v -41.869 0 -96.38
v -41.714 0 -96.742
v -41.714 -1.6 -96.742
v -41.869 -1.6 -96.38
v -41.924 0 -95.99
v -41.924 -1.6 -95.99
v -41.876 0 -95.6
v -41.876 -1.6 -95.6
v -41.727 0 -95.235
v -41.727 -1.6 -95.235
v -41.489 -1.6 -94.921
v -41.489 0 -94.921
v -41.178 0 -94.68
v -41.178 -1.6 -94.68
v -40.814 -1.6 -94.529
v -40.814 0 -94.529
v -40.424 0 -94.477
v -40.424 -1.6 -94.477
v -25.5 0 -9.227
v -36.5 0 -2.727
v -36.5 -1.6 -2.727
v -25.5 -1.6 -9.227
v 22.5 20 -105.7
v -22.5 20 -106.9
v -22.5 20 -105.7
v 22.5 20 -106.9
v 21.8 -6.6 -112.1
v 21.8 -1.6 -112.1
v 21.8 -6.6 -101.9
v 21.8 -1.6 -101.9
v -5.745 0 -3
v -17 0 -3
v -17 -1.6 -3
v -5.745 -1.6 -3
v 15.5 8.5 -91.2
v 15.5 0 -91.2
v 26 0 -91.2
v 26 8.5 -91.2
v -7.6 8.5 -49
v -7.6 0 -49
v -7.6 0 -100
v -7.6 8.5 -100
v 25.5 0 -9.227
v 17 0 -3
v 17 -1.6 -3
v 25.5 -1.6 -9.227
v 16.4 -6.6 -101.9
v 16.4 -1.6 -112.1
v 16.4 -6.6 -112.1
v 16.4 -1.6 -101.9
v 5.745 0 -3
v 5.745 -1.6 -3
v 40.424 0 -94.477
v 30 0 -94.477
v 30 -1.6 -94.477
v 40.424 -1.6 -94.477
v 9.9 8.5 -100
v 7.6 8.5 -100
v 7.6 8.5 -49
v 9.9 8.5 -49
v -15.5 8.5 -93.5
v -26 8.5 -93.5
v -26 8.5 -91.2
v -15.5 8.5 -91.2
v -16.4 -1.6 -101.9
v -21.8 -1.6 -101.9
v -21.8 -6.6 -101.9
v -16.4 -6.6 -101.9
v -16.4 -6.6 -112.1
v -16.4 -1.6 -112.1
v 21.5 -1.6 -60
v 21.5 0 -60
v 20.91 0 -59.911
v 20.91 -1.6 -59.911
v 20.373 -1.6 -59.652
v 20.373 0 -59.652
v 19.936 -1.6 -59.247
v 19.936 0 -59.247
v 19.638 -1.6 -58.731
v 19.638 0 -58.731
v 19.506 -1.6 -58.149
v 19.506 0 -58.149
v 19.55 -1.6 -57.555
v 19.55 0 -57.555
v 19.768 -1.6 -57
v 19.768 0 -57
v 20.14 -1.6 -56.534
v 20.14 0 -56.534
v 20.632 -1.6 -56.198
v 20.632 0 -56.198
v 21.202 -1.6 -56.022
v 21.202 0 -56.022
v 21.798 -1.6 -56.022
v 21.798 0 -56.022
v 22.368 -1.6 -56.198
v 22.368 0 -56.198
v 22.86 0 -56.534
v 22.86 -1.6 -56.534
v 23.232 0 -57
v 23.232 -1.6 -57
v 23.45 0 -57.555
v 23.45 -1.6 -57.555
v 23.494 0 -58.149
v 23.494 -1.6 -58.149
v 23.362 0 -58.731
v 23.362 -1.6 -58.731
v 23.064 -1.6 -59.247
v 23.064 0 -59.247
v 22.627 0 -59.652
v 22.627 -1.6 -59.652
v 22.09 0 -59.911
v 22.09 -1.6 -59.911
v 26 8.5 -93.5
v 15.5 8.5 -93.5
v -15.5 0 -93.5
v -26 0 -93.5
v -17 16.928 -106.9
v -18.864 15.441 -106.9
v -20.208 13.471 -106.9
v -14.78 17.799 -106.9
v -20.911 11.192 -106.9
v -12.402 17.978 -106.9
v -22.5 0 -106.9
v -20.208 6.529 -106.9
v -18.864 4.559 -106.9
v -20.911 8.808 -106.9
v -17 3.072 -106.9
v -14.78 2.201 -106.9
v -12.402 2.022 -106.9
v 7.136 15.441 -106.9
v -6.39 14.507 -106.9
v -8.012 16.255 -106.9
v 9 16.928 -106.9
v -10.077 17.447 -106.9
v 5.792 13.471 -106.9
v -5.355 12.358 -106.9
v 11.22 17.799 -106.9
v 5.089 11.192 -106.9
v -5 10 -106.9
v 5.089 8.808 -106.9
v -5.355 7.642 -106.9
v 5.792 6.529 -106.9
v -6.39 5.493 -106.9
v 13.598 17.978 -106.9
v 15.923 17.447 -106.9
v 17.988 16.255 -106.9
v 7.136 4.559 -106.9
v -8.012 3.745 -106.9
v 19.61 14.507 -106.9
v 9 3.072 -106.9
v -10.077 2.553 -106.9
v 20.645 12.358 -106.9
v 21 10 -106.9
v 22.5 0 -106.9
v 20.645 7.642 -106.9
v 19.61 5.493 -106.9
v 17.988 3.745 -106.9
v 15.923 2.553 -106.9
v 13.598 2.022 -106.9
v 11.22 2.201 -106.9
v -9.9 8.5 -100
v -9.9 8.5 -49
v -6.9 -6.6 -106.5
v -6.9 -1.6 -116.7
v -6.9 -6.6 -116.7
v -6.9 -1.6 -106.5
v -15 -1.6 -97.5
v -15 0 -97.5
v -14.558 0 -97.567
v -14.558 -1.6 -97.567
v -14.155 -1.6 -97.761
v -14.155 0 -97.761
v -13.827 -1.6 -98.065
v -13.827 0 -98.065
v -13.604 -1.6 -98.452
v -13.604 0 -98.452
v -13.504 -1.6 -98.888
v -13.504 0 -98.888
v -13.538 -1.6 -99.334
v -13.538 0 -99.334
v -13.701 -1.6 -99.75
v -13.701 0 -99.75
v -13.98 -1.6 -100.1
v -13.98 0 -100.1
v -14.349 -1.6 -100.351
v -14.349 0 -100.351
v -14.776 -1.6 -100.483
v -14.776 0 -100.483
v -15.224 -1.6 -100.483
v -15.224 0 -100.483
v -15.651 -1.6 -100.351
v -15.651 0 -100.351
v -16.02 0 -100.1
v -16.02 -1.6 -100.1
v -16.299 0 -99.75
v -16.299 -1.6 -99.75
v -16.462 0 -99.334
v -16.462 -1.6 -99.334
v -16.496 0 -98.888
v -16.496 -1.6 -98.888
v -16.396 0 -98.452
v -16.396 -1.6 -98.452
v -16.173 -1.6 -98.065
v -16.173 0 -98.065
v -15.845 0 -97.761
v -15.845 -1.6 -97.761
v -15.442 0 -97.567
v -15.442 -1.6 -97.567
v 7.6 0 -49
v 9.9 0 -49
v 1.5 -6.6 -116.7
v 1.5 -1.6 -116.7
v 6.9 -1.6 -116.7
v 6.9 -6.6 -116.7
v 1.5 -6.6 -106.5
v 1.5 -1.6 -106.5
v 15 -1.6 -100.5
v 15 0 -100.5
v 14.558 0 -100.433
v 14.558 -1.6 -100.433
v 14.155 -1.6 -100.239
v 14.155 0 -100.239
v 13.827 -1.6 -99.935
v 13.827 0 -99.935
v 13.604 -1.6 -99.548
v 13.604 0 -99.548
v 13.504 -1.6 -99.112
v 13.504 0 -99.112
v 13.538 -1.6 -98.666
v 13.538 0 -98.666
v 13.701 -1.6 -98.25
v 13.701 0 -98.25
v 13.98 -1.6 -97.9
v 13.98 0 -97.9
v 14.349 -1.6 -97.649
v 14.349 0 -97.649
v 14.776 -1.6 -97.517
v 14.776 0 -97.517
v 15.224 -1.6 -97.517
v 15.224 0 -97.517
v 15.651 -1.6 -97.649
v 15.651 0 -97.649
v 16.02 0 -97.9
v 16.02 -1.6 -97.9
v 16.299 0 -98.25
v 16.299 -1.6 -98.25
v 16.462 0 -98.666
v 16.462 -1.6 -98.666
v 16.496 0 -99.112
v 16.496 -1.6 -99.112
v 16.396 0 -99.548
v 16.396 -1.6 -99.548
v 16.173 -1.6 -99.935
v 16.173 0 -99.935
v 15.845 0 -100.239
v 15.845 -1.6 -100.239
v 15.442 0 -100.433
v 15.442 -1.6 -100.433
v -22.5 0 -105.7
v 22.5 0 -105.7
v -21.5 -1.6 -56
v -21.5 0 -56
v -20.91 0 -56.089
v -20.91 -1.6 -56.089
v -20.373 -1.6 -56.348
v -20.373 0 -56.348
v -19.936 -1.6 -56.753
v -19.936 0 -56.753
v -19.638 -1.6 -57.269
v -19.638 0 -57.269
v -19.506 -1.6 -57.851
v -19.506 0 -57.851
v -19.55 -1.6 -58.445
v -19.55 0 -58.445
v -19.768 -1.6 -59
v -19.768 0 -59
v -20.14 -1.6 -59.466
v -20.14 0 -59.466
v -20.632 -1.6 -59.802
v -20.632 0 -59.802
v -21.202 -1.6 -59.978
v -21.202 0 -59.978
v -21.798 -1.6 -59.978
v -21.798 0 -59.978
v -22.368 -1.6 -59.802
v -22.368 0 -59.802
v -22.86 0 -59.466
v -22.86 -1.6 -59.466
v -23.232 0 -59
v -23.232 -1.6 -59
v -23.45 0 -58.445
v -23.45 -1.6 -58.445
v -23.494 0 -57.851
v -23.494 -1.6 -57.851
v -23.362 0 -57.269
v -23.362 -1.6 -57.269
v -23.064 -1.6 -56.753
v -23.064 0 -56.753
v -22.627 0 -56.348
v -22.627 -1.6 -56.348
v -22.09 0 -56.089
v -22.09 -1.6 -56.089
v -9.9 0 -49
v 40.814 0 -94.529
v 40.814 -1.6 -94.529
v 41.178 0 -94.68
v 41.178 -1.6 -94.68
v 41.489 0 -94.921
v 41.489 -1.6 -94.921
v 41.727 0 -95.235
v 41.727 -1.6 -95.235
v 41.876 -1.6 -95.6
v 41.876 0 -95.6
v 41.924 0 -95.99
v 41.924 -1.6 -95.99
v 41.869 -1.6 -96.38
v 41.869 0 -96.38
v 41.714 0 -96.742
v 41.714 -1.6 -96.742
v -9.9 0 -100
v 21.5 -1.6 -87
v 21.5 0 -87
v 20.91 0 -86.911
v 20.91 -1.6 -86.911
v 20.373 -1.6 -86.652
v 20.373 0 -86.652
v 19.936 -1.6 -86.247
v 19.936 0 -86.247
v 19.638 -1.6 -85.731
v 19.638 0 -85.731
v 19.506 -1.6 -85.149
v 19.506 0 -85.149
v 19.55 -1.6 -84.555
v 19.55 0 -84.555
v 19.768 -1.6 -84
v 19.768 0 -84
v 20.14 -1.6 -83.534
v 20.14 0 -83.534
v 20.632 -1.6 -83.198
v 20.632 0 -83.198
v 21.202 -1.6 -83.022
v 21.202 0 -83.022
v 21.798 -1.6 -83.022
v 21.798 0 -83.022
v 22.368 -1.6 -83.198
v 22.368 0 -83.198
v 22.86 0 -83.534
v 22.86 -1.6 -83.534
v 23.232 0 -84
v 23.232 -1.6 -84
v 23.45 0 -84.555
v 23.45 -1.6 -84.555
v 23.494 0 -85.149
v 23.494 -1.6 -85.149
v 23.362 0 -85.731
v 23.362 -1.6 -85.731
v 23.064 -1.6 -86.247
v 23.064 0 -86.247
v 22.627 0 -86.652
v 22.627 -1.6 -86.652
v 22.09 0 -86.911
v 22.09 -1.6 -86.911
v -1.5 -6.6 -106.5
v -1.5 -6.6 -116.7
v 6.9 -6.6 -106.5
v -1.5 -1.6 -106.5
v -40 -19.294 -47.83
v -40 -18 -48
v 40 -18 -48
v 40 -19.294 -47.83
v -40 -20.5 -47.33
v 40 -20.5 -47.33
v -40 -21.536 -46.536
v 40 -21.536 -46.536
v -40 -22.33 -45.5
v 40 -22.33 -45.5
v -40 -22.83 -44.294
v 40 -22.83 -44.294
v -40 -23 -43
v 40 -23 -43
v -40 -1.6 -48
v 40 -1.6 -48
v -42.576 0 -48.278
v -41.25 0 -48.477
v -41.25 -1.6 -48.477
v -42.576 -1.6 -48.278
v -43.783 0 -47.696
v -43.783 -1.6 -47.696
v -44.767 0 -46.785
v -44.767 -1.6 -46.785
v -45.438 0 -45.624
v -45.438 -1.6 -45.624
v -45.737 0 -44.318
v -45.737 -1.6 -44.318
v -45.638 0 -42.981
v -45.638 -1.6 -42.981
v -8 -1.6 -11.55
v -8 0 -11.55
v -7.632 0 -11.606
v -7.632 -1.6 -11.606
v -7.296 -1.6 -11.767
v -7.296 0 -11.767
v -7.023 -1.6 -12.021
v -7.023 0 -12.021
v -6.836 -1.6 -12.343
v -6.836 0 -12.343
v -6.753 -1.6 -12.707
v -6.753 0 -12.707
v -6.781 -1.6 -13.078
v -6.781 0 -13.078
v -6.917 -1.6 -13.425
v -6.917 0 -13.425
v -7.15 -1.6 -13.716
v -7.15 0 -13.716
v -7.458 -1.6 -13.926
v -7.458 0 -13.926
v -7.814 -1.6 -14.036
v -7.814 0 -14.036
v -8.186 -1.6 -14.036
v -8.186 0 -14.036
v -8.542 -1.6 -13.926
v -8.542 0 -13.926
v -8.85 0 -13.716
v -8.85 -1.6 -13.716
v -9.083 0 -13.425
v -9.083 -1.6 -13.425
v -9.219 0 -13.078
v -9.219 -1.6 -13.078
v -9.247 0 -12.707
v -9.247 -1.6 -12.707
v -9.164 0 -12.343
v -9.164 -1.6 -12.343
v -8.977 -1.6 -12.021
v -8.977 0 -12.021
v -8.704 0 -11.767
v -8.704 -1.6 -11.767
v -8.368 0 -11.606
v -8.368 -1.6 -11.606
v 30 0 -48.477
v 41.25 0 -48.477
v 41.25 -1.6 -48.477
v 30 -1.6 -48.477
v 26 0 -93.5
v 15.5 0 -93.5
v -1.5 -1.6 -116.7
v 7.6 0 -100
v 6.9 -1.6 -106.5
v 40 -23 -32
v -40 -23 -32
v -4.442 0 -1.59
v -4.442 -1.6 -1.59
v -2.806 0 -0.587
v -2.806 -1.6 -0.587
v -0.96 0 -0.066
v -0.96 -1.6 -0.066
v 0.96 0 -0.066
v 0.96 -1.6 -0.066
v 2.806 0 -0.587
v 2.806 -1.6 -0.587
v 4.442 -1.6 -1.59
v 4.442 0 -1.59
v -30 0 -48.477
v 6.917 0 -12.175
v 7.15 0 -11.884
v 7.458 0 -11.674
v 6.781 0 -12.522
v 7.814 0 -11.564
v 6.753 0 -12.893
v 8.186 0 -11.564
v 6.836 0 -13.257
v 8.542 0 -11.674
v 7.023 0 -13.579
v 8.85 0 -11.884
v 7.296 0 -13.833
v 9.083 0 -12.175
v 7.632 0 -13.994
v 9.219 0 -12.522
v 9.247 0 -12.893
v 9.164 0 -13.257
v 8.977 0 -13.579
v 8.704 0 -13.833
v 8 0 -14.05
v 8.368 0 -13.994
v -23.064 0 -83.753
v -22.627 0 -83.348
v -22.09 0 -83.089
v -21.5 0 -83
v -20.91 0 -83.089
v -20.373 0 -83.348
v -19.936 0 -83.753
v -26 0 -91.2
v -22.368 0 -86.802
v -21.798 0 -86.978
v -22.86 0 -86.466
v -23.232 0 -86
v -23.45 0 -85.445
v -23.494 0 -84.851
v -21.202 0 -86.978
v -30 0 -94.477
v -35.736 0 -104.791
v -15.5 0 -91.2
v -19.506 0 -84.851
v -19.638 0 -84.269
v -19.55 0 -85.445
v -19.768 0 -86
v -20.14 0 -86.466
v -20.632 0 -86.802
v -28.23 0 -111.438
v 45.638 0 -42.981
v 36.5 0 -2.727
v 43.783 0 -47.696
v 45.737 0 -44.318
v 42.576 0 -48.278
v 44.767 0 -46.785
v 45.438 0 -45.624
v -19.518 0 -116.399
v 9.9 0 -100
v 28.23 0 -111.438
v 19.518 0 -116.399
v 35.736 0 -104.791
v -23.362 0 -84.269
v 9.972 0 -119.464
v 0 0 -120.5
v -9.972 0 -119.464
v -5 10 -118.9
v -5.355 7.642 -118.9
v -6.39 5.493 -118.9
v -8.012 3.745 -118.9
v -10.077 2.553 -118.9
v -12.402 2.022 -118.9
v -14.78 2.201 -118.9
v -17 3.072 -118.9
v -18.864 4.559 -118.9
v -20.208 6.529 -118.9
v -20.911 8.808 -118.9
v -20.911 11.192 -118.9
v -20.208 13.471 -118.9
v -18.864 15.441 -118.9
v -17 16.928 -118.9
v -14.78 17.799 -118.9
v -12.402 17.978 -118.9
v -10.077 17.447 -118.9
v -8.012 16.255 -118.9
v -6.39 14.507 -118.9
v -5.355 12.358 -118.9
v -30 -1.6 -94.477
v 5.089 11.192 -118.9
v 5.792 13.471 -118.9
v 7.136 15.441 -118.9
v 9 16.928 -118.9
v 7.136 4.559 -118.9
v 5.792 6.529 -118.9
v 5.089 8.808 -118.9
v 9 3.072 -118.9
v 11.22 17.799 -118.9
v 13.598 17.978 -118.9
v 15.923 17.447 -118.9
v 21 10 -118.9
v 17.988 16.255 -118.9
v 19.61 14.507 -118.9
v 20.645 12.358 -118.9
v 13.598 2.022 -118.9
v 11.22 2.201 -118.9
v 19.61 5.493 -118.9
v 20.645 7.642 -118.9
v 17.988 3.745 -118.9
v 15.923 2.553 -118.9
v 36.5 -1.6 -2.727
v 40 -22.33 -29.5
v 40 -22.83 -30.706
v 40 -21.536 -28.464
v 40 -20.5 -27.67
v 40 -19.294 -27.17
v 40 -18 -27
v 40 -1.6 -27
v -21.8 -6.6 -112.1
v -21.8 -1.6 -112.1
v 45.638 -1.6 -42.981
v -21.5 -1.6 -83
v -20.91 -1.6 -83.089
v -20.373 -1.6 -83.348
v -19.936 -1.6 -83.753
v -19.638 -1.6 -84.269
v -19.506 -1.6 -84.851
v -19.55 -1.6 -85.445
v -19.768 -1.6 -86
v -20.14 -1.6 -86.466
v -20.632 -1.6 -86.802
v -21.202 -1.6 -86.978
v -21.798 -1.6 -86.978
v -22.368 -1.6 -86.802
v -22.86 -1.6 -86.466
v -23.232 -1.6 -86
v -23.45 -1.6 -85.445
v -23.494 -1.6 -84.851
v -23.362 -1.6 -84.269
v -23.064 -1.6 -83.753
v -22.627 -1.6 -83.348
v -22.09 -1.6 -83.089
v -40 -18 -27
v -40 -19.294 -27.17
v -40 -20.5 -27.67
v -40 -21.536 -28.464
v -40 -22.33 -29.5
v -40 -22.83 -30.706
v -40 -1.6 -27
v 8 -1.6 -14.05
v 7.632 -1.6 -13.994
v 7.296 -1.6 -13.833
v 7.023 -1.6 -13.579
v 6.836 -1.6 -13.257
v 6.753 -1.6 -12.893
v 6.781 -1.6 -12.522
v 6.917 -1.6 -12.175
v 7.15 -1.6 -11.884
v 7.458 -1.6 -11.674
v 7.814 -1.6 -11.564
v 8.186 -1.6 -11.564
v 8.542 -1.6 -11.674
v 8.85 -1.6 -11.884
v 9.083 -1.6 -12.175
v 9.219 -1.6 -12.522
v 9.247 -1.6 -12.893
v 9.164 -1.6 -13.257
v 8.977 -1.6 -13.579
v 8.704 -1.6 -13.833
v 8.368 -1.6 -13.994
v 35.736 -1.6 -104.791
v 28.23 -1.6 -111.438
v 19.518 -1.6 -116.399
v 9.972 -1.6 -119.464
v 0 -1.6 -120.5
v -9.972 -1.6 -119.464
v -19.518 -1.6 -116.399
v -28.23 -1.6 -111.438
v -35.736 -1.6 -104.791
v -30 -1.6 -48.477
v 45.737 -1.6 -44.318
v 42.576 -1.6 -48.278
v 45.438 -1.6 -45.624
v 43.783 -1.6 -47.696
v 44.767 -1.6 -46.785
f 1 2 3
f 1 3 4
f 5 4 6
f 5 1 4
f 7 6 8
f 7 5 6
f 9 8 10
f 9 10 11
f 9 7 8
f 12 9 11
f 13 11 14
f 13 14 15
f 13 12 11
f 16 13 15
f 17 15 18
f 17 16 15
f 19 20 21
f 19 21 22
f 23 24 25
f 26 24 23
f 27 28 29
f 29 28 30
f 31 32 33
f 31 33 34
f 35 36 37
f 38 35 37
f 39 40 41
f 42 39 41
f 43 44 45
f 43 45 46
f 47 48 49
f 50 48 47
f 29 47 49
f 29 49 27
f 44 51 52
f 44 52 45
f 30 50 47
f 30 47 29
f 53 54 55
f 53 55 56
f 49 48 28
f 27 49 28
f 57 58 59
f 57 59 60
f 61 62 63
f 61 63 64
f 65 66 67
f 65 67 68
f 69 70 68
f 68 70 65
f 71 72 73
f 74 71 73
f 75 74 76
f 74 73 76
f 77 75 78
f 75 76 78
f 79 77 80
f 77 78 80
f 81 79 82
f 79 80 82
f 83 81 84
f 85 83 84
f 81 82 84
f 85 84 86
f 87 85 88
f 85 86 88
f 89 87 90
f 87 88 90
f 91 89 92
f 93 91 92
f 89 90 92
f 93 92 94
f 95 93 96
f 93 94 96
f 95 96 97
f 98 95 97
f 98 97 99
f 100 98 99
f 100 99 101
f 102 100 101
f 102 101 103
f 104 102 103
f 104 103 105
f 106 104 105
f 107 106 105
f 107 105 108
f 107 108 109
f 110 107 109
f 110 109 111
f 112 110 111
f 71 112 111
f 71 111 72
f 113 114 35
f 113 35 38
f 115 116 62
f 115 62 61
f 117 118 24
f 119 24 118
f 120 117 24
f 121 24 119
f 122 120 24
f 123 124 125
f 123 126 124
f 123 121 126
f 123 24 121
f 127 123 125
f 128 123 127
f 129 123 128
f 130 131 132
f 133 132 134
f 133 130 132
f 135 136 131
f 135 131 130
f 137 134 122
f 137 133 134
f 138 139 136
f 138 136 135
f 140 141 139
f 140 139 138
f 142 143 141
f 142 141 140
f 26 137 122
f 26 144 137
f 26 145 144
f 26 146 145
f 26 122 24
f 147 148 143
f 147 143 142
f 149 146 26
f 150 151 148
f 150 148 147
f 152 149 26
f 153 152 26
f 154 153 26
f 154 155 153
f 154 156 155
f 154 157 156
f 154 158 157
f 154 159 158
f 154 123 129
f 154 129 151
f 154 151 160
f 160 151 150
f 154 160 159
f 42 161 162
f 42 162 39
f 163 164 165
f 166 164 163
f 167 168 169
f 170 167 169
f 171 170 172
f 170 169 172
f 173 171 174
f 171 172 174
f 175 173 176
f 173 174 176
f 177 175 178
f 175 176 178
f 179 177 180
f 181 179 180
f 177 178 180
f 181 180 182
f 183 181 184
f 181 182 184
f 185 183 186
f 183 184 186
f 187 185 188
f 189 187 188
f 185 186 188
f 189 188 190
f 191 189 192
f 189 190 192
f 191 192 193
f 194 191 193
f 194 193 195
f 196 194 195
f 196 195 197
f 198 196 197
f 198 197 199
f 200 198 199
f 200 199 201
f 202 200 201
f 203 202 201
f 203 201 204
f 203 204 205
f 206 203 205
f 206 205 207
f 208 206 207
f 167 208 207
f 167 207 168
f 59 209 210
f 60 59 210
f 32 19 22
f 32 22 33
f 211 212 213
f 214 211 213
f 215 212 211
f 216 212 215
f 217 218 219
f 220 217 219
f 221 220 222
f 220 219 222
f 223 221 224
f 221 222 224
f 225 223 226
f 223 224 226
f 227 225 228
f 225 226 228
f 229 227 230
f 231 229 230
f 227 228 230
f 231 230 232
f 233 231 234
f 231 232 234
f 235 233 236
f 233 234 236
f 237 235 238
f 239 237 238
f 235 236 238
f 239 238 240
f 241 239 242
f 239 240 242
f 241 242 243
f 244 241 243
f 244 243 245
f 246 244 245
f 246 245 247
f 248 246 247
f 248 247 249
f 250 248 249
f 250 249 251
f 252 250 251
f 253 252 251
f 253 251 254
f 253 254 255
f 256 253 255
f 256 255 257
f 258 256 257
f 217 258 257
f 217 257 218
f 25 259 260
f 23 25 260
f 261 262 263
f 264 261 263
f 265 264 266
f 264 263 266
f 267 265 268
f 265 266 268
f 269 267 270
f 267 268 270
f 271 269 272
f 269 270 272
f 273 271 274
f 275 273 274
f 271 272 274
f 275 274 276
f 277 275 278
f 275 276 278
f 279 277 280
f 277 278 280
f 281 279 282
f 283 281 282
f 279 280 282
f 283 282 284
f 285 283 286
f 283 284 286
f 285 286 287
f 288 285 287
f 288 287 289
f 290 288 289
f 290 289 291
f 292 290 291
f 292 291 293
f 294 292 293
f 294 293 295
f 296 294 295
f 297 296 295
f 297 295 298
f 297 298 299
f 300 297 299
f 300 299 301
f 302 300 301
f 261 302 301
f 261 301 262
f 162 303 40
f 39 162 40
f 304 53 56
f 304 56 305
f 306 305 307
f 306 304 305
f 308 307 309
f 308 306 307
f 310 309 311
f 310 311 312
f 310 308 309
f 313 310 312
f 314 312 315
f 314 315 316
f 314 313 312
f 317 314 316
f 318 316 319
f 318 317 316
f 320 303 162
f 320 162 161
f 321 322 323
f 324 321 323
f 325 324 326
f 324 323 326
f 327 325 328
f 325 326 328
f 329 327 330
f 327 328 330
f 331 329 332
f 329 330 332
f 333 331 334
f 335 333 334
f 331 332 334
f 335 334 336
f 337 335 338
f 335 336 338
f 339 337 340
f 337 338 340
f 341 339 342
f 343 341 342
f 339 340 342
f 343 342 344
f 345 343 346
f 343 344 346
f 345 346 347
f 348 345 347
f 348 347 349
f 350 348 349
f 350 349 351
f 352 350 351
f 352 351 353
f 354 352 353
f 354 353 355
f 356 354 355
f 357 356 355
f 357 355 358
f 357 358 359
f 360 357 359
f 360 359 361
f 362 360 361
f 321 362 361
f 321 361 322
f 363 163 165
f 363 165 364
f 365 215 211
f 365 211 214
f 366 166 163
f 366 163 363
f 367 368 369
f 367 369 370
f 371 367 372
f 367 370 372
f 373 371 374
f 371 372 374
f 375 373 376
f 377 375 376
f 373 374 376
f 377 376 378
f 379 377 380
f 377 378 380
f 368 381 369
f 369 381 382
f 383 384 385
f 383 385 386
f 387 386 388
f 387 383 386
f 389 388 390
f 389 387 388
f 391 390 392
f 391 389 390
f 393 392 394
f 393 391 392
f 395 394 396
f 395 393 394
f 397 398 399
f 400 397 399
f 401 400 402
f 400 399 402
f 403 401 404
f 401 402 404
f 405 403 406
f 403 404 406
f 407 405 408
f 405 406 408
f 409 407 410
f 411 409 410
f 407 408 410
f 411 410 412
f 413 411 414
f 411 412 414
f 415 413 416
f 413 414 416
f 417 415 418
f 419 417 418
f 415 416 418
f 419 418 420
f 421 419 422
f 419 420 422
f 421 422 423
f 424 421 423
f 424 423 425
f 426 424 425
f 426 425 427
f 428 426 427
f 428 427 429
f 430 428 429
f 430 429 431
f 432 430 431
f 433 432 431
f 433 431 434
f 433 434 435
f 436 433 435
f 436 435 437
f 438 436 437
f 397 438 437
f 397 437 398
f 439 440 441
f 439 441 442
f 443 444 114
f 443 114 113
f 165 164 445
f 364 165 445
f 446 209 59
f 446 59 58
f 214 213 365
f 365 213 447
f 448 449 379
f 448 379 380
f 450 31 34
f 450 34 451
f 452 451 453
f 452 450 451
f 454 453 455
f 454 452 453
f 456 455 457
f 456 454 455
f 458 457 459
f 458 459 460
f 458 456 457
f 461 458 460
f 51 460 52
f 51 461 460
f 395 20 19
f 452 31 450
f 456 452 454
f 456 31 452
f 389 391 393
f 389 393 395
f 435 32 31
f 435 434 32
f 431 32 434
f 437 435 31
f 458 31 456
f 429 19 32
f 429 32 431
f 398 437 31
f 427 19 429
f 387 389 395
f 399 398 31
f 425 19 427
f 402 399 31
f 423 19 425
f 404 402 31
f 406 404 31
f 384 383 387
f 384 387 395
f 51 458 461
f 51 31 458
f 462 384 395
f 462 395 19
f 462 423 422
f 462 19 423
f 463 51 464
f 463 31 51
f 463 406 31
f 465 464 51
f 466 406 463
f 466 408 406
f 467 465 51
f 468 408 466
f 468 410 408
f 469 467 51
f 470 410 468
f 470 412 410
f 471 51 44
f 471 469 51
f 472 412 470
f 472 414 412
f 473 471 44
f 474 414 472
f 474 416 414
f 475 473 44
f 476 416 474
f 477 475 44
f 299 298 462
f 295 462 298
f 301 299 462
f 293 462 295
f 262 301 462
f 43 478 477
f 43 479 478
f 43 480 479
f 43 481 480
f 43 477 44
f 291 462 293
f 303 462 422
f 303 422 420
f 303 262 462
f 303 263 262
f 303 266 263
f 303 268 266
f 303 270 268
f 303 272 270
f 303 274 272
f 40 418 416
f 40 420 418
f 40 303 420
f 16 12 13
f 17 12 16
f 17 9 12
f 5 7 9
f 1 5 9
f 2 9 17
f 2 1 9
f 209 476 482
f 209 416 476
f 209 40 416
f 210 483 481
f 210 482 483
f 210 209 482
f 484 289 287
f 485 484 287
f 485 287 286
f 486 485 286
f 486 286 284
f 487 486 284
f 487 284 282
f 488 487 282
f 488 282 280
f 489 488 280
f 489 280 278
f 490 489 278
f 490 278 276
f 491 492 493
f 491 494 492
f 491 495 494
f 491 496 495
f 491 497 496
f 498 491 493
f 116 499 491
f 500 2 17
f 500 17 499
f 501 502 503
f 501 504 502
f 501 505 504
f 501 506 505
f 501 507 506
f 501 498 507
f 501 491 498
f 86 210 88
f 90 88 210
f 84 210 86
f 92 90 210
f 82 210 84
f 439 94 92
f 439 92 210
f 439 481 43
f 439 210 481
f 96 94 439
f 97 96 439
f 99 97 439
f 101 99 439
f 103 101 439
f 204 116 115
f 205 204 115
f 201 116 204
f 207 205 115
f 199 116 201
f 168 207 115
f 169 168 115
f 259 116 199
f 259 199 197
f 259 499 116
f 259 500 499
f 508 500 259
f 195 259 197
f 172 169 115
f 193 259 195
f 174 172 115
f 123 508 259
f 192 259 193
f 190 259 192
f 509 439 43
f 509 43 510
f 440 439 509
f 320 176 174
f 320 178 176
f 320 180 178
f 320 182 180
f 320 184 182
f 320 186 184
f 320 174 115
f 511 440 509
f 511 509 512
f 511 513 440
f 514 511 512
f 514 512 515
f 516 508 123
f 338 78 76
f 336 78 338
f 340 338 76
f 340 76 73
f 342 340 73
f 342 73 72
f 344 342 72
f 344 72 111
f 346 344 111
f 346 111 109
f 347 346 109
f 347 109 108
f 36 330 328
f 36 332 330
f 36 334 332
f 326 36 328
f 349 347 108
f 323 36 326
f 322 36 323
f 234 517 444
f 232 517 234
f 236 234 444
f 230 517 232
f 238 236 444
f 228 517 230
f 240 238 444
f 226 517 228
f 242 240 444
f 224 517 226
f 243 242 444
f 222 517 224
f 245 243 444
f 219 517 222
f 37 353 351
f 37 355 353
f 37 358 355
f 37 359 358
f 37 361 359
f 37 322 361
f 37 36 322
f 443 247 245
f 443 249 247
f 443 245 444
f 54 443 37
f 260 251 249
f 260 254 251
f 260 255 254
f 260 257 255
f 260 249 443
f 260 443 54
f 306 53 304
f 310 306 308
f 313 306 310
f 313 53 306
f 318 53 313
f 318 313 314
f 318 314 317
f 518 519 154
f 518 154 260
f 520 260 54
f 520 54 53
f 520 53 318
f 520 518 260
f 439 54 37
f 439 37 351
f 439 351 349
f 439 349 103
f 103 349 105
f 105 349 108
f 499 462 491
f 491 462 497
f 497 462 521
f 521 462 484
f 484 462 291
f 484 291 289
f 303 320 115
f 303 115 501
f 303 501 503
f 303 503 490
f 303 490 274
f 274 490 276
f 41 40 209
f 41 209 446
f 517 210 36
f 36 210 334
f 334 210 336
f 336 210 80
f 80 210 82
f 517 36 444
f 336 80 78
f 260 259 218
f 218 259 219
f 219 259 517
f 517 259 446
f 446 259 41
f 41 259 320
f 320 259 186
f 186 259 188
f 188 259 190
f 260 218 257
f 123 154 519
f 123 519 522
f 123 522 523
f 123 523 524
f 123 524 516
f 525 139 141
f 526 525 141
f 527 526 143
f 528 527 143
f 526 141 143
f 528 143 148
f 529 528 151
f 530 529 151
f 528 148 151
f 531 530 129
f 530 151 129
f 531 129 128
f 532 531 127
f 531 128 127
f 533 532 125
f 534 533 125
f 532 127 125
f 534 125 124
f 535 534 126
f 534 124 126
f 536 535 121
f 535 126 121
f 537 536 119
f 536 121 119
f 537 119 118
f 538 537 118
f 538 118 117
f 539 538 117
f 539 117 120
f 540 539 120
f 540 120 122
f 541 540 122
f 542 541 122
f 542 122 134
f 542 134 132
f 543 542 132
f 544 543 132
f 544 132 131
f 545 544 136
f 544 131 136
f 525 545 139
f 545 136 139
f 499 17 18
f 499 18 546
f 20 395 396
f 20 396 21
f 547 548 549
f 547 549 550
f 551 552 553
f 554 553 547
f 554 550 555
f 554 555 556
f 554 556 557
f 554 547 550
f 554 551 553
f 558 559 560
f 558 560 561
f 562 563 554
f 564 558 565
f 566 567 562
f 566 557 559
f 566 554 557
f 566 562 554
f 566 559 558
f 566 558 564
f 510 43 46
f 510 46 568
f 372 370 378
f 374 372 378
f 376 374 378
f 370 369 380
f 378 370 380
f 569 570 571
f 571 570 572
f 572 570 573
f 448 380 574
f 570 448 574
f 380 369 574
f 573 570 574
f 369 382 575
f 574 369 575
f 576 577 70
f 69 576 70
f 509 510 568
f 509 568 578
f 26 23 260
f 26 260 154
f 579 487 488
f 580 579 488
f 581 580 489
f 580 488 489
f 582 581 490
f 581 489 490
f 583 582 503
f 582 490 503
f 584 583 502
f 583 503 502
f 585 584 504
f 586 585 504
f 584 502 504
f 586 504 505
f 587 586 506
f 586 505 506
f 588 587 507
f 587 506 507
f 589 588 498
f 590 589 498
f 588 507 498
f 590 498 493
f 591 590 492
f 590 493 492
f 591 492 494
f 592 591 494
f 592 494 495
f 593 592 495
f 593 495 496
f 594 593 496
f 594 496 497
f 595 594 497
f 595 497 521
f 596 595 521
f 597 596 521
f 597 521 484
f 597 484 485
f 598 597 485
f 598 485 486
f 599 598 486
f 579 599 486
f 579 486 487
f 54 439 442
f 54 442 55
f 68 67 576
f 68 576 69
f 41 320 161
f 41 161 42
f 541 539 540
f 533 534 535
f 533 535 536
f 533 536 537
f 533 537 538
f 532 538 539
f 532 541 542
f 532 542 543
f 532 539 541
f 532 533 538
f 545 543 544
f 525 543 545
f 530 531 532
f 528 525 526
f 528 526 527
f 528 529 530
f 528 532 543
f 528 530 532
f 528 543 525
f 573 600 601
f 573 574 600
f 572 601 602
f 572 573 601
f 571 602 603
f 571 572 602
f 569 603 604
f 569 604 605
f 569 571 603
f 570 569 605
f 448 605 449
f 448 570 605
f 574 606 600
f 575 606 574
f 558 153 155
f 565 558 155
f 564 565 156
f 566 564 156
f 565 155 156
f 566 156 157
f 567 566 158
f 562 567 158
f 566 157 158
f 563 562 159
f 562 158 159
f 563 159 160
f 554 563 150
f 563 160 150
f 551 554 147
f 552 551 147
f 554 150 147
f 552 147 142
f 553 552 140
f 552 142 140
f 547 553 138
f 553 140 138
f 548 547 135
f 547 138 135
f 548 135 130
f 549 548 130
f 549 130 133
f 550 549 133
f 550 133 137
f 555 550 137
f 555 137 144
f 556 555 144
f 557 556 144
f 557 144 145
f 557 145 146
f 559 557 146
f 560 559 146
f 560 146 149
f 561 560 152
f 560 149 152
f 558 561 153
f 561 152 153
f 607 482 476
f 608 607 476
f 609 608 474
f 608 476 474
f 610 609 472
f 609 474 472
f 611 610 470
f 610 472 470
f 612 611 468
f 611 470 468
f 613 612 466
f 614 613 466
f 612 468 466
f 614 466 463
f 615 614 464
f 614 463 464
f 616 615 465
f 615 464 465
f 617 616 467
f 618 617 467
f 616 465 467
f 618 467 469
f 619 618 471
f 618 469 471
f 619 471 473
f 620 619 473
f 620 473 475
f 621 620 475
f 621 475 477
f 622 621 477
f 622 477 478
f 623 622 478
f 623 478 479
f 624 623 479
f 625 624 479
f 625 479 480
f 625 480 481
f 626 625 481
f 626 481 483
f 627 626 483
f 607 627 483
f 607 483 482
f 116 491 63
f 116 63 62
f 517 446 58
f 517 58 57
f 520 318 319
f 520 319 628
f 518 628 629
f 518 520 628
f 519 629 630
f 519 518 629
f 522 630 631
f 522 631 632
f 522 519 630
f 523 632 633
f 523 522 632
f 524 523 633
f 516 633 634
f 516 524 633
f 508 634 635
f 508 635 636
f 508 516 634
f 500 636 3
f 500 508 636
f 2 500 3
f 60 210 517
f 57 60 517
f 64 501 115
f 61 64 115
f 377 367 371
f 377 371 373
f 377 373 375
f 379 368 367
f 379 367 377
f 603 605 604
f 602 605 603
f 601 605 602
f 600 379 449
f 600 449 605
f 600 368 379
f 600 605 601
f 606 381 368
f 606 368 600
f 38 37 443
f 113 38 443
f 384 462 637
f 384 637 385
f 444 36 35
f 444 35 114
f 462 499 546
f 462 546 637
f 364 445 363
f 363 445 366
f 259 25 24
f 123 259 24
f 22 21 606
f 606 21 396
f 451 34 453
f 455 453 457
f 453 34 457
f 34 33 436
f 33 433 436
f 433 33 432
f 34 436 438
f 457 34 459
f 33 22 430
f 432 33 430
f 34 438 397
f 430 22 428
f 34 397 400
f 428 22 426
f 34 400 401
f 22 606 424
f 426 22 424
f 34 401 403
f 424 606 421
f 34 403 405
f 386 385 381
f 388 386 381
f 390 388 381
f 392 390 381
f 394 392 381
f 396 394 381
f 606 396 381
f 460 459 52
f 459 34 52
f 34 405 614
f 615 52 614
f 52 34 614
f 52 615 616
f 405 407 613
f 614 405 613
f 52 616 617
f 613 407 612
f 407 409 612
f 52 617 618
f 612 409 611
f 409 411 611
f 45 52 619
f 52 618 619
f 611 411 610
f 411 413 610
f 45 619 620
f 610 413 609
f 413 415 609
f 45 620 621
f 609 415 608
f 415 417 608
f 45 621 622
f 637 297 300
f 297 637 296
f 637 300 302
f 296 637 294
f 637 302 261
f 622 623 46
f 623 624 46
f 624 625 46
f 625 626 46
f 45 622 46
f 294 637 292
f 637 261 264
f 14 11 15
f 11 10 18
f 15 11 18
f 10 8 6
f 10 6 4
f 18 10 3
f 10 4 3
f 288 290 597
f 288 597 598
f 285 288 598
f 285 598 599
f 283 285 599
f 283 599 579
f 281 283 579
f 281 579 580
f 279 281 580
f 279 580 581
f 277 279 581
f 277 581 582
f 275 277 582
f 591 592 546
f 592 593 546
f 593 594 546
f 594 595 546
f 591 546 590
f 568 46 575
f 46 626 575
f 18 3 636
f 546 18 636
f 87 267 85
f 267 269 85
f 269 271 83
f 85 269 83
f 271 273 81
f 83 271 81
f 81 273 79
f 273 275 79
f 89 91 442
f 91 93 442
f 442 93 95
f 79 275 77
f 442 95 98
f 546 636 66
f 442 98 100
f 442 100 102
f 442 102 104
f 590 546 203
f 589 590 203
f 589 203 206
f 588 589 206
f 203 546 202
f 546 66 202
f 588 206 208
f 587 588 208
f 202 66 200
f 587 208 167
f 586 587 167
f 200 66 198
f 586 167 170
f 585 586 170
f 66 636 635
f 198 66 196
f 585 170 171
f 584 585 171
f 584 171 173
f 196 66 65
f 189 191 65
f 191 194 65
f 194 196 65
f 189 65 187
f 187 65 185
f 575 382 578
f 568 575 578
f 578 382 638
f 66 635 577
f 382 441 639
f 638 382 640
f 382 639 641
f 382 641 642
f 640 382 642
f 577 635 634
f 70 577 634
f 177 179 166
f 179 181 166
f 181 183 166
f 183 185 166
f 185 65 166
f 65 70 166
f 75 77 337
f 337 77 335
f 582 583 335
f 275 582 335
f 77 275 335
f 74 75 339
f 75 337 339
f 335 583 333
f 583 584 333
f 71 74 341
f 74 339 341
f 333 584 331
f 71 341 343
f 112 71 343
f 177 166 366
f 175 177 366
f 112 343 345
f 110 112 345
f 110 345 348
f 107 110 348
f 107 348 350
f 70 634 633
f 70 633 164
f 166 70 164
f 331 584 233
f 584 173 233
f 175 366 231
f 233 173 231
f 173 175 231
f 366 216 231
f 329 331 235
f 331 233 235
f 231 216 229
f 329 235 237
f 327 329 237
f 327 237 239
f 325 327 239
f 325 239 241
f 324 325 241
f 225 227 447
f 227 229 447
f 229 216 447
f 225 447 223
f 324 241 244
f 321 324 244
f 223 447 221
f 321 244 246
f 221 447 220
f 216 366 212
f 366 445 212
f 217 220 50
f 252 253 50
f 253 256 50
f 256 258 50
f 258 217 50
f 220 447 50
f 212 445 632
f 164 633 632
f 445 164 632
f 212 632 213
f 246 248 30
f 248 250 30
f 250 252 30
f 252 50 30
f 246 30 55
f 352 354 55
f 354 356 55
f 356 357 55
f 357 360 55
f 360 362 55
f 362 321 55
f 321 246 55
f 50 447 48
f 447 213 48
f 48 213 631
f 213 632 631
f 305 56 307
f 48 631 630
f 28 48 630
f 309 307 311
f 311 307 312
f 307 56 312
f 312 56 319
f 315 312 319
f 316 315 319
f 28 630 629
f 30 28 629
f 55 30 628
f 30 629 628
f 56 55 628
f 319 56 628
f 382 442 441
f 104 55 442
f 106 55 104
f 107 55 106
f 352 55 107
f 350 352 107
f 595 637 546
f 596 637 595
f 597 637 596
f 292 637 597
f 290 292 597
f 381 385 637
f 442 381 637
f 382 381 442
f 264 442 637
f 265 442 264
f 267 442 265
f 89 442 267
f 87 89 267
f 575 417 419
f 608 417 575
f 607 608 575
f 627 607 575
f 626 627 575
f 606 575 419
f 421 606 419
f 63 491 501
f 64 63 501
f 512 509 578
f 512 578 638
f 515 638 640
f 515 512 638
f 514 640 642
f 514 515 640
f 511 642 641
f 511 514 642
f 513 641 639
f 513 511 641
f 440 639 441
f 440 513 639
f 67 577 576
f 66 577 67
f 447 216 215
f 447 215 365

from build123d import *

# Parameters (mm, degrees)
BOSS_EXTRUDE1_DEPTH = 1.6
SKETCH6_W           = 45
SKETCH6_H           = 1.2
BOSS_EXTRUDE2_DEPTH = 20
SKETCH7_R           = 8
BOSS_EXTRUDE3_DEPTH = 12
SKETCH10_W          = 80
SKETCH10_H          = 21
BOSS_EXTRUDE4_DEPTH = 21.4
FILLET1_R           = 5
CUT_EXTRUDE1_REACH  = 132.929
SKETCH11_R          = 1.25
SKETCH11_R_2        = 2
SKETCH11_R_3        = 1.5
SKETCH12_W          = 2.3
SKETCH12_H          = 51
SKETCH12_W_2        = 10.5
SKETCH12_H_2        = 2.3
BOSS_EXTRUDE5_DEPTH = 8.5
SKETCH13_W          = 5.4
SKETCH13_H          = 10.2
BOSS_EXTRUDE7_DEPTH = 5


with BuildPart() as part:
    # Sketch5 → Boss-Extrude1 (new body)
    with BuildSketch(Plane(origin=(0, 0, 0), x_dir=(1, 0, 0), z_dir=(0, 1, 0))):
        with BuildLine():
            Line((-25.5, 9.227208522), (-17, 3))
            Line((-17, 3), (-5.744562647, 3))
            ThreePointArc((-5.744562647, 3), (0, 0), (5.744562647, 3))
            Line((5.744562647, 3), (17, 3))
            Line((17, 3), (25.5, 9.227208522))
            Line((25.5, 9.227208522), (36.5, 2.727208522))
            Line((36.5, 2.727208522), (45.638339075, 42.980975538))
            ThreePointArc((45.638339075, 42.980975538), (44.766606918, 46.784961322), (41.25, 48.477208522))
            Line((41.25, 48.477208522), (30, 48.477208522))
            Line((30, 48.477208522), (30, 94.477208522))
            Line((30, 94.477208522), (40.42392202, 94.477208522))
            ThreePointArc((40.42392202, 94.477208522), (41.72734925, 95.234862609), (41.714047191, 96.742438582))
            ThreePointArc((41.714047191, 96.742438582), (0, 120.5), (-41.714047191, 96.742438582))
            ThreePointArc((-41.714047191, 96.742438582), (-41.72734925, 95.234862609), (-40.42392202, 94.477208522))
            Line((-40.42392202, 94.477208522), (-30, 94.477208522))
            Line((-30, 94.477208522), (-30, 48.477208522))
            Line((-30, 48.477208522), (-41.25, 48.477208522))
            ThreePointArc((-41.25, 48.477208522), (-44.766606918, 46.784961322), (-45.638339075, 42.980975538))
            Line((-45.638339075, 42.980975538), (-36.5, 2.727208522))
            Line((-36.5, 2.727208522), (-25.5, 9.227208522))
        make_face()
    extrude(amount=-BOSS_EXTRUDE1_DEPTH)

    # Sketch6 → Boss-Extrude2 (add)
    with BuildSketch(Plane(origin=(0, 0, 0), x_dir=(1, 0, 0), z_dir=(0, 1, 0))):
        with Locations((0, 106.3)):
            Rectangle(SKETCH6_W, SKETCH6_H)
    extrude(amount=BOSS_EXTRUDE2_DEPTH)

    # Sketch7 → Boss-Extrude3 (add)
    with BuildSketch(Plane(origin=(0, 0, -106.9), x_dir=(-1, 0, 0), z_dir=(0, 0, -1))):
        with Locations(Location((-13, 10, 0), (0, 0, 180))):
            Circle(SKETCH7_R)
        with Locations(Location((13, 10, 0), (0, 0, 180))):
            Circle(SKETCH7_R)
    extrude(amount=BOSS_EXTRUDE3_DEPTH)

    # Sketch10 → Boss-Extrude4 (add)
    with BuildSketch(Plane.XZ.offset(1.6)):
        with Locations((0, -37.5)):
            Rectangle(SKETCH10_W, SKETCH10_H)
    extrude(amount=BOSS_EXTRUDE4_DEPTH)

    # Fillet1
    fillet1_edges = [part.edges().sort_by_distance(p)[0] for p in [
        (0, -23, -48),
        (0, -23, -27),
    ]]
    fillet(fillet1_edges, radius=FILLET1_R)

    # Sketch11 → Cut-Extrude1 (cut, up to next)
    with BuildSketch(Plane(origin=(0, 0, 0), x_dir=(1, 0, 0), z_dir=(0, 1, 0)), mode=Mode.PRIVATE) as cut_extrude1_sk1:
        with Locations(Location((-8, 12.8, 0), (0, 0, 270))):
            Circle(SKETCH11_R)
    cut_extrude1_tool1 = extrude(cut_extrude1_sk1.sketch, amount=-CUT_EXTRUDE1_REACH, mode=Mode.PRIVATE) & part.part
    # Sketch11 → Cut-Extrude1 (cut, up to next)
    with BuildSketch(Plane(origin=(0, 0, 0), x_dir=(1, 0, 0), z_dir=(0, 1, 0)), mode=Mode.PRIVATE) as cut_extrude1_sk2:
        with Locations(Location((-21.5, 58, 0), (0, 0, 270))):
            Circle(SKETCH11_R_2)
    cut_extrude1_tool2 = extrude(cut_extrude1_sk2.sketch, amount=-CUT_EXTRUDE1_REACH, mode=Mode.PRIVATE) & part.part
    # Sketch11 → Cut-Extrude1 (cut, up to next)
    with BuildSketch(Plane(origin=(0, 0, 0), x_dir=(1, 0, 0), z_dir=(0, 1, 0)), mode=Mode.PRIVATE) as cut_extrude1_sk3:
        with Locations(Location((-21.5, 85, 0), (0, 0, 270))):
            Circle(SKETCH11_R_2)
    cut_extrude1_tool3 = extrude(cut_extrude1_sk3.sketch, amount=-CUT_EXTRUDE1_REACH, mode=Mode.PRIVATE) & part.part
    # Sketch11 → Cut-Extrude1 (cut, up to next)
    with BuildSketch(Plane(origin=(0, 0, 0), x_dir=(1, 0, 0), z_dir=(0, 1, 0)), mode=Mode.PRIVATE) as cut_extrude1_sk4:
        with Locations(Location((-15, 99, 0), (0, 0, 270))):
            Circle(SKETCH11_R_3)
    cut_extrude1_tool4 = extrude(cut_extrude1_sk4.sketch, amount=-CUT_EXTRUDE1_REACH, mode=Mode.PRIVATE) & part.part
    # Sketch11 → Cut-Extrude1 (cut, up to next)
    with BuildSketch(Plane(origin=(0, 0, 0), x_dir=(1, 0, 0), z_dir=(0, 1, 0)), mode=Mode.PRIVATE) as cut_extrude1_sk5:
        with Locations(Location((15, 99, 0), (0, 0, 90))):
            Circle(SKETCH11_R_3)
    cut_extrude1_tool5 = extrude(cut_extrude1_sk5.sketch, amount=-CUT_EXTRUDE1_REACH, mode=Mode.PRIVATE) & part.part
    # Sketch11 → Cut-Extrude1 (cut, up to next)
    with BuildSketch(Plane(origin=(0, 0, 0), x_dir=(1, 0, 0), z_dir=(0, 1, 0)), mode=Mode.PRIVATE) as cut_extrude1_sk6:
        with Locations(Location((21.5, 85, 0), (0, 0, 90))):
            Circle(SKETCH11_R_2)
    cut_extrude1_tool6 = extrude(cut_extrude1_sk6.sketch, amount=-CUT_EXTRUDE1_REACH, mode=Mode.PRIVATE) & part.part
    # Sketch11 → Cut-Extrude1 (cut, up to next)
    with BuildSketch(Plane(origin=(0, 0, 0), x_dir=(1, 0, 0), z_dir=(0, 1, 0)), mode=Mode.PRIVATE) as cut_extrude1_sk7:
        with Locations(Location((21.5, 58, 0), (0, 0, 90))):
            Circle(SKETCH11_R_2)
    cut_extrude1_tool7 = extrude(cut_extrude1_sk7.sketch, amount=-CUT_EXTRUDE1_REACH, mode=Mode.PRIVATE) & part.part
    # Sketch11 → Cut-Extrude1 (cut, up to next)
    with BuildSketch(Plane(origin=(0, 0, 0), x_dir=(1, 0, 0), z_dir=(0, 1, 0)), mode=Mode.PRIVATE) as cut_extrude1_sk8:
        with Locations(Location((8, 12.8, 0), (0, 0, 90))):
            Circle(SKETCH11_R)
    cut_extrude1_tool8 = extrude(cut_extrude1_sk8.sketch, amount=-CUT_EXTRUDE1_REACH, mode=Mode.PRIVATE) & part.part
    add(cut_extrude1_tool1.solids().sort_by_distance((-8, 0, -12.8))[0], mode=Mode.SUBTRACT)
    add(cut_extrude1_tool2.solids().sort_by_distance((-21.5, 0, -58))[0], mode=Mode.SUBTRACT)
    add(cut_extrude1_tool3.solids().sort_by_distance((-21.5, 0, -85))[0], mode=Mode.SUBTRACT)
    add(cut_extrude1_tool4.solids().sort_by_distance((-15, 0, -99))[0], mode=Mode.SUBTRACT)
    add(cut_extrude1_tool5.solids().sort_by_distance((15, 0, -99))[0], mode=Mode.SUBTRACT)
    add(cut_extrude1_tool6.solids().sort_by_distance((21.5, 0, -85))[0], mode=Mode.SUBTRACT)
    add(cut_extrude1_tool7.solids().sort_by_distance((21.5, 0, -58))[0], mode=Mode.SUBTRACT)
    add(cut_extrude1_tool8.solids().sort_by_distance((8, 0, -12.8))[0], mode=Mode.SUBTRACT)

    # Sketch12 → Boss-Extrude5 (add)
    with BuildSketch(Plane(origin=(0, 0, 0), x_dir=(1, 0, 0), z_dir=(0, 1, 0))):
        with Locations((-8.75, 74.5)):
            Rectangle(SKETCH12_W, SKETCH12_H)
        with Locations((-20.75, 92.35)):
            Rectangle(SKETCH12_W_2, SKETCH12_H_2)
        with Locations((20.75, 92.35)):
            Rectangle(SKETCH12_W_2, SKETCH12_H_2)
        with Locations((8.75, 74.5)):
            Rectangle(SKETCH12_W, SKETCH12_H)
    extrude(amount=BOSS_EXTRUDE5_DEPTH)

    # Sketch13 → Boss-Extrude7 (add)
    with BuildSketch(Plane.XZ.offset(1.6)):
        with Locations((4.2, -111.6)):
            Rectangle(SKETCH13_W, SKETCH13_H)
        with Locations((-4.2, -111.6)):
            Rectangle(SKETCH13_W, SKETCH13_H)
        with Locations((-19.1, -107)):
            Rectangle(SKETCH13_W, SKETCH13_H)
        with Locations((19.1, -107)):
            Rectangle(SKETCH13_W, SKETCH13_H)
    extrude(amount=BOSS_EXTRUDE7_DEPTH)


solid = part.part
